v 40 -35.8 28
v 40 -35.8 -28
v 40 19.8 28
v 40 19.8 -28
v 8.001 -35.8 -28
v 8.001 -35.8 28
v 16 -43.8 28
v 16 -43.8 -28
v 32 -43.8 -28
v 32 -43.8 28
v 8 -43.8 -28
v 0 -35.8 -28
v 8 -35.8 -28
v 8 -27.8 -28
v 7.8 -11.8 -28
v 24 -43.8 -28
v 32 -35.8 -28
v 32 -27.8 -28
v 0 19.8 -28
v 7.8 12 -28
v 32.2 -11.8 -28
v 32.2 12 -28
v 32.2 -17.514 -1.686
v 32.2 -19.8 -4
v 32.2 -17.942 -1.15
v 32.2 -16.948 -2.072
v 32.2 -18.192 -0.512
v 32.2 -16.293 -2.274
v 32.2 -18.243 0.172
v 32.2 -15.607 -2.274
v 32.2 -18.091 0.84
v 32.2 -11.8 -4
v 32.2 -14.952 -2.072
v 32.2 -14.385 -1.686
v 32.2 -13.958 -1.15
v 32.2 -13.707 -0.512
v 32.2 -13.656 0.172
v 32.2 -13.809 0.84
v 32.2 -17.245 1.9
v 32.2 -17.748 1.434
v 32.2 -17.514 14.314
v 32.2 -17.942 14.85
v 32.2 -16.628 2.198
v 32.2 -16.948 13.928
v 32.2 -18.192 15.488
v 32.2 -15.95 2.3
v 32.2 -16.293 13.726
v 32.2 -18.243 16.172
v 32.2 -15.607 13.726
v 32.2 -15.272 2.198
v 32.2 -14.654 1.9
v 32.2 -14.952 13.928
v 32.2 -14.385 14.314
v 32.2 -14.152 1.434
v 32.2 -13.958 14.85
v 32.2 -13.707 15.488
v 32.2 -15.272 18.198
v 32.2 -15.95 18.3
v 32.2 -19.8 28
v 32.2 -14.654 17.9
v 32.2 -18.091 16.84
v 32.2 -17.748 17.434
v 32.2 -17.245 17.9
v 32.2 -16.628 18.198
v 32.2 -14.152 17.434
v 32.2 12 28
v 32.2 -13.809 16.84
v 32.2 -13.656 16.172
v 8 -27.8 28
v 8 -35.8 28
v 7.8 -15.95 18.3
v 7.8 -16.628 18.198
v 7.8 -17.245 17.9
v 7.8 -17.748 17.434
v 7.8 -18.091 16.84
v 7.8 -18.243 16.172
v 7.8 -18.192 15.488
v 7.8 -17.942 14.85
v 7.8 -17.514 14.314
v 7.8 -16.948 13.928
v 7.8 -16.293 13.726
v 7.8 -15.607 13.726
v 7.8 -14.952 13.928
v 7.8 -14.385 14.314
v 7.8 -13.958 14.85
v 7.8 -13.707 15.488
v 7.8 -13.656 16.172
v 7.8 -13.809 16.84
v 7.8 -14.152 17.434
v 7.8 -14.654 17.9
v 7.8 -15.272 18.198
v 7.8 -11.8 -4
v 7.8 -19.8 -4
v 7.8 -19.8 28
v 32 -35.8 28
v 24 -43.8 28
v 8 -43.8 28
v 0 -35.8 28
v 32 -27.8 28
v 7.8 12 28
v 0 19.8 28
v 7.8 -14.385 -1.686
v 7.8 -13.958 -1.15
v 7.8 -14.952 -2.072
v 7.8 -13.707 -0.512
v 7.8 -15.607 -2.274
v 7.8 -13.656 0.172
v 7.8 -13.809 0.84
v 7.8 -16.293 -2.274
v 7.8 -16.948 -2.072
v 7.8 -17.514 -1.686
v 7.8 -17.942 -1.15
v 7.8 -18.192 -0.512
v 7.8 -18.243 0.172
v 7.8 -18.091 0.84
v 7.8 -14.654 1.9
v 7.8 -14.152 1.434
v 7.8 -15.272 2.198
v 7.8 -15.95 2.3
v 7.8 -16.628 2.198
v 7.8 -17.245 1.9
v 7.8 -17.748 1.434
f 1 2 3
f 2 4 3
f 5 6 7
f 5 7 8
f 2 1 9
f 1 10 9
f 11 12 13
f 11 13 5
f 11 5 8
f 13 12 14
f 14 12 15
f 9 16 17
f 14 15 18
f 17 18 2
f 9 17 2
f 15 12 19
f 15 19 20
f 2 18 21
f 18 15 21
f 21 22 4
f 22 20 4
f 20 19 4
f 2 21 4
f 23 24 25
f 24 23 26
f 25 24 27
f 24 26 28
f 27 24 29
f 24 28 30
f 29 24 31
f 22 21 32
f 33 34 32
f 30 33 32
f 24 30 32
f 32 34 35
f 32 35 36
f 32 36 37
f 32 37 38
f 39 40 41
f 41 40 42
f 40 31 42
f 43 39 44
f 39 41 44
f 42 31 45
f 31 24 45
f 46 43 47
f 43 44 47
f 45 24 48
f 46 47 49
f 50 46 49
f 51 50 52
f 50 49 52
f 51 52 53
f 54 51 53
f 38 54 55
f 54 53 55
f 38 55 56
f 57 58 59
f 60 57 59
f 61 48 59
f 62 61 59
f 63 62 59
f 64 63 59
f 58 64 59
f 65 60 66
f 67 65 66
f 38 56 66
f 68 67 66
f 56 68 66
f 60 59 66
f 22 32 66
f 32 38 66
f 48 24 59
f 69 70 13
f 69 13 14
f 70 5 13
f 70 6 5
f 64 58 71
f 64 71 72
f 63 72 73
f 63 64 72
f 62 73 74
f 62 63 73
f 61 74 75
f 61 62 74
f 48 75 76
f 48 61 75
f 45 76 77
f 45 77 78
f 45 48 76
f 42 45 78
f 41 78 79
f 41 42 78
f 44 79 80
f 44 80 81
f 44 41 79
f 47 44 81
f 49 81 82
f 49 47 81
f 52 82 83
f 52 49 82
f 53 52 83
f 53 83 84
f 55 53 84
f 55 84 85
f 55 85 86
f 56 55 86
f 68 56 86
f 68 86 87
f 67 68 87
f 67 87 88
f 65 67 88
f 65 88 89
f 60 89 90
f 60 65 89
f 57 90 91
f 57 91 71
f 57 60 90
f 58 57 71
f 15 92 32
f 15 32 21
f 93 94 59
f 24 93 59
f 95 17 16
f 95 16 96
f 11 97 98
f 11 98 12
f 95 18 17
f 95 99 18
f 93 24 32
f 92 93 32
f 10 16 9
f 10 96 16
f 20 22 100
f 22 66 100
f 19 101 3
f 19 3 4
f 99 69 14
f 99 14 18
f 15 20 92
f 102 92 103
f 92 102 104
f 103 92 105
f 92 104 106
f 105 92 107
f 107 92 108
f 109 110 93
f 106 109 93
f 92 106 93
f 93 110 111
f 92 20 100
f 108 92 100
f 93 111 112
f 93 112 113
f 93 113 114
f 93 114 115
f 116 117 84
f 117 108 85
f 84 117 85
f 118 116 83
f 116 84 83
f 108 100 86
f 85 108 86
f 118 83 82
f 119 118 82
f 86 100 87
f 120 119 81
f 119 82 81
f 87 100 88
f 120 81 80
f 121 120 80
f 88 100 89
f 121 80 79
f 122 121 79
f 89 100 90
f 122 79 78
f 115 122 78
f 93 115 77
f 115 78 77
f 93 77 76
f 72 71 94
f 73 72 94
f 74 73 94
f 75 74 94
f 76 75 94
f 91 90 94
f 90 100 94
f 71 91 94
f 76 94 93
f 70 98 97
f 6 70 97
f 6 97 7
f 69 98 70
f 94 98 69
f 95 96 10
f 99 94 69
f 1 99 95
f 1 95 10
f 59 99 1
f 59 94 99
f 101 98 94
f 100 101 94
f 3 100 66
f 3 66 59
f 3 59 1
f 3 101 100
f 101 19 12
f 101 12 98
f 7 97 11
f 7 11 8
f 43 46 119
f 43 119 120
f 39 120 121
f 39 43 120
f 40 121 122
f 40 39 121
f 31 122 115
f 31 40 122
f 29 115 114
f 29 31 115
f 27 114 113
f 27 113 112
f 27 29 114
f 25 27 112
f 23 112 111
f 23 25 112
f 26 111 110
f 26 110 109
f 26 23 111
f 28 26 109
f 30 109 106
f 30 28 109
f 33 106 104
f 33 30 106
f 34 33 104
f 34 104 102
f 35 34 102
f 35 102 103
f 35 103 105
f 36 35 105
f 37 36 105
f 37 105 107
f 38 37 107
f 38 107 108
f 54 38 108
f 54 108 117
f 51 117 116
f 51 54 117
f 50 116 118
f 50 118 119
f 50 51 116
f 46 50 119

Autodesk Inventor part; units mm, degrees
ref_plane "YZ Plane" through (0, 0, 0) normal (1, 0, 0) x (0, 1, 0)
ref_plane "XZ Plane" through (0, 0, 0) normal (0, 1, 0) x (-1, 0, 0)
ref_plane "XY Plane" through (0, 0, 0) normal (0, 0, 1) x (1, 0, 0)
sketch "Sketch1" plane through (0, 0, 0) normal (1, 0, 0) x (0, 1, 0)
  line L0 (-19.8, 28) -> (19.8, 28)
  line L1 (19.8, 28) -> (19.8, -28)
  line L2 (19.8, -28) -> (-19.8, -28)
  line L3 (-19.8, -28) -> (-19.8, 28)
  line L4 (-19.8, 28) -> (19.8, -28) construction
  line L5 (19.8, 28) -> (-19.8, -28) construction
  point P0 (0, 0)
  dimension "d0" = 39.6
  dimension "d1" = 56
extrude "Extrusion1" add sketch "Sketch1" along normal blind 40
sketch "Sketch2" plane through (0, -19.8, 28) normal (0, 0, 1) x (1, 0, 0)
  line L0 (7.8, 0) -> (32.2, 0)
  line L1 (32.2, 0) -> (32.2, 31.8)
  line L2 (32.2, 31.8) -> (7.8, 31.8)
  line L3 (7.8, 31.8) -> (7.8, 0)
  line L4 (0, 0) -> (40, 0) projected
  line L5 (40, 39.6) -> (40, 0) projected
  dimension "d4" = 24.4
  dimension "d5" = 31.8
  dimension "d6" = 7.8
extrude "Extrusion2" cut sketch "Sketch2" against normal blind 64
sketch "Sketch3" plane through (32.2, -19.8, 28) normal (-1, 0, 0) x (0, 0, 1)
  circle A0 centre (-12, 3.8502) radius 2.3
  circle A1 centre (-28, 3.8502) radius 2.3
  line L0 (0, 31.8) -> (0, 0) projected
  point P0 (-28, 19.8)
  dimension "d9" = 4.6
  dimension "d10" = 4.6
  dimension "d11" = 16
  dimension "d12" = 12
extrude "Extrusion3" add sketch "Sketch3" along normal blind 26
sketch "Sketch4" plane through (7.8, -19.8, 28) normal (1, 0, 0) x (0, 0, -1)
  line L0 (56, 0) -> (0, 0) projected
  line L1 (56, 0) -> (32, 0)
  line L2 (32, 0) -> (32, 8)
  line L3 (32, 8) -> (56, 8)
  line L4 (56, 8) -> (56, 0)
  point P0 (28, 19.8)
  point P1 (32, 0)
  dimension "d15" = 24
  dimension "d16" = 8
extrude "Extrusion4" add sketch "Sketch4" along normal blind 26
sketch "Sketch14" plane through (0, 19.8, 28) normal (0, 1, 0) x (1, 0, 0)
  line L0 (20, 0) -> (20, 56) projected
  point P0 (0, 28)
sketch "Sketch15" plane through (0, -19.8, -28) normal (0, -1, 0) x (1, 0, 0)
  line L0 (40, 0) -> (40, 56) projected
  line L1 (0, 0) -> (40, 0) projected
  line L2 (0, 56) -> (40, 56) projected
  line L3 (0, 0) -> (0, 56) projected
  point P0 (0, 28)
extrude "Extrusion7" add sketch "Sketch15" along normal blind 24
sketch "Sketch16" plane through (0, 19.8, 28) normal (0, 0, 1) x (1, 0, 0)
  line L0 (8, -47.6) -> (32, -47.6)
  line L1 (32, -47.6) -> (32, -55.6)
  line L2 (32, -55.6) -> (8, -55.6)
  line L3 (8, -55.6) -> (8, -47.6)
  line L4 (40, -63.6) -> (0, -63.6) projected
  line L5 (0, 0) -> (0, -63.6) projected
  line L6 (16, -55.6) -> (24, -55.6)
  line L7 (24, -55.6) -> (24, -63.6)
  line L8 (24, -63.6) -> (16, -63.6)
  line L9 (16, -63.6) -> (16, -55.6)
  point P0 (0, -19.8)
  dimension "d37" = 24
  dimension "d38" = 8
  dimension "d39" = 8
  dimension "d40" = 8
  dimension "d41" = 8
  dimension "d42" = 8
  dimension "d43" = 16
extrude "Extrusion8" cut sketch "Sketch16" against normal through all
chamfer "Chamfer1" distance 8 angle 45 2 edges at (40, -43.8, 0) (0, -43.8, 0)
chamfer "Chamfer2" distance 8 angle 45 2 edges at (16, -35.8, 0) (24, -35.8, 0)
properties part number "MotorHolder_X"
